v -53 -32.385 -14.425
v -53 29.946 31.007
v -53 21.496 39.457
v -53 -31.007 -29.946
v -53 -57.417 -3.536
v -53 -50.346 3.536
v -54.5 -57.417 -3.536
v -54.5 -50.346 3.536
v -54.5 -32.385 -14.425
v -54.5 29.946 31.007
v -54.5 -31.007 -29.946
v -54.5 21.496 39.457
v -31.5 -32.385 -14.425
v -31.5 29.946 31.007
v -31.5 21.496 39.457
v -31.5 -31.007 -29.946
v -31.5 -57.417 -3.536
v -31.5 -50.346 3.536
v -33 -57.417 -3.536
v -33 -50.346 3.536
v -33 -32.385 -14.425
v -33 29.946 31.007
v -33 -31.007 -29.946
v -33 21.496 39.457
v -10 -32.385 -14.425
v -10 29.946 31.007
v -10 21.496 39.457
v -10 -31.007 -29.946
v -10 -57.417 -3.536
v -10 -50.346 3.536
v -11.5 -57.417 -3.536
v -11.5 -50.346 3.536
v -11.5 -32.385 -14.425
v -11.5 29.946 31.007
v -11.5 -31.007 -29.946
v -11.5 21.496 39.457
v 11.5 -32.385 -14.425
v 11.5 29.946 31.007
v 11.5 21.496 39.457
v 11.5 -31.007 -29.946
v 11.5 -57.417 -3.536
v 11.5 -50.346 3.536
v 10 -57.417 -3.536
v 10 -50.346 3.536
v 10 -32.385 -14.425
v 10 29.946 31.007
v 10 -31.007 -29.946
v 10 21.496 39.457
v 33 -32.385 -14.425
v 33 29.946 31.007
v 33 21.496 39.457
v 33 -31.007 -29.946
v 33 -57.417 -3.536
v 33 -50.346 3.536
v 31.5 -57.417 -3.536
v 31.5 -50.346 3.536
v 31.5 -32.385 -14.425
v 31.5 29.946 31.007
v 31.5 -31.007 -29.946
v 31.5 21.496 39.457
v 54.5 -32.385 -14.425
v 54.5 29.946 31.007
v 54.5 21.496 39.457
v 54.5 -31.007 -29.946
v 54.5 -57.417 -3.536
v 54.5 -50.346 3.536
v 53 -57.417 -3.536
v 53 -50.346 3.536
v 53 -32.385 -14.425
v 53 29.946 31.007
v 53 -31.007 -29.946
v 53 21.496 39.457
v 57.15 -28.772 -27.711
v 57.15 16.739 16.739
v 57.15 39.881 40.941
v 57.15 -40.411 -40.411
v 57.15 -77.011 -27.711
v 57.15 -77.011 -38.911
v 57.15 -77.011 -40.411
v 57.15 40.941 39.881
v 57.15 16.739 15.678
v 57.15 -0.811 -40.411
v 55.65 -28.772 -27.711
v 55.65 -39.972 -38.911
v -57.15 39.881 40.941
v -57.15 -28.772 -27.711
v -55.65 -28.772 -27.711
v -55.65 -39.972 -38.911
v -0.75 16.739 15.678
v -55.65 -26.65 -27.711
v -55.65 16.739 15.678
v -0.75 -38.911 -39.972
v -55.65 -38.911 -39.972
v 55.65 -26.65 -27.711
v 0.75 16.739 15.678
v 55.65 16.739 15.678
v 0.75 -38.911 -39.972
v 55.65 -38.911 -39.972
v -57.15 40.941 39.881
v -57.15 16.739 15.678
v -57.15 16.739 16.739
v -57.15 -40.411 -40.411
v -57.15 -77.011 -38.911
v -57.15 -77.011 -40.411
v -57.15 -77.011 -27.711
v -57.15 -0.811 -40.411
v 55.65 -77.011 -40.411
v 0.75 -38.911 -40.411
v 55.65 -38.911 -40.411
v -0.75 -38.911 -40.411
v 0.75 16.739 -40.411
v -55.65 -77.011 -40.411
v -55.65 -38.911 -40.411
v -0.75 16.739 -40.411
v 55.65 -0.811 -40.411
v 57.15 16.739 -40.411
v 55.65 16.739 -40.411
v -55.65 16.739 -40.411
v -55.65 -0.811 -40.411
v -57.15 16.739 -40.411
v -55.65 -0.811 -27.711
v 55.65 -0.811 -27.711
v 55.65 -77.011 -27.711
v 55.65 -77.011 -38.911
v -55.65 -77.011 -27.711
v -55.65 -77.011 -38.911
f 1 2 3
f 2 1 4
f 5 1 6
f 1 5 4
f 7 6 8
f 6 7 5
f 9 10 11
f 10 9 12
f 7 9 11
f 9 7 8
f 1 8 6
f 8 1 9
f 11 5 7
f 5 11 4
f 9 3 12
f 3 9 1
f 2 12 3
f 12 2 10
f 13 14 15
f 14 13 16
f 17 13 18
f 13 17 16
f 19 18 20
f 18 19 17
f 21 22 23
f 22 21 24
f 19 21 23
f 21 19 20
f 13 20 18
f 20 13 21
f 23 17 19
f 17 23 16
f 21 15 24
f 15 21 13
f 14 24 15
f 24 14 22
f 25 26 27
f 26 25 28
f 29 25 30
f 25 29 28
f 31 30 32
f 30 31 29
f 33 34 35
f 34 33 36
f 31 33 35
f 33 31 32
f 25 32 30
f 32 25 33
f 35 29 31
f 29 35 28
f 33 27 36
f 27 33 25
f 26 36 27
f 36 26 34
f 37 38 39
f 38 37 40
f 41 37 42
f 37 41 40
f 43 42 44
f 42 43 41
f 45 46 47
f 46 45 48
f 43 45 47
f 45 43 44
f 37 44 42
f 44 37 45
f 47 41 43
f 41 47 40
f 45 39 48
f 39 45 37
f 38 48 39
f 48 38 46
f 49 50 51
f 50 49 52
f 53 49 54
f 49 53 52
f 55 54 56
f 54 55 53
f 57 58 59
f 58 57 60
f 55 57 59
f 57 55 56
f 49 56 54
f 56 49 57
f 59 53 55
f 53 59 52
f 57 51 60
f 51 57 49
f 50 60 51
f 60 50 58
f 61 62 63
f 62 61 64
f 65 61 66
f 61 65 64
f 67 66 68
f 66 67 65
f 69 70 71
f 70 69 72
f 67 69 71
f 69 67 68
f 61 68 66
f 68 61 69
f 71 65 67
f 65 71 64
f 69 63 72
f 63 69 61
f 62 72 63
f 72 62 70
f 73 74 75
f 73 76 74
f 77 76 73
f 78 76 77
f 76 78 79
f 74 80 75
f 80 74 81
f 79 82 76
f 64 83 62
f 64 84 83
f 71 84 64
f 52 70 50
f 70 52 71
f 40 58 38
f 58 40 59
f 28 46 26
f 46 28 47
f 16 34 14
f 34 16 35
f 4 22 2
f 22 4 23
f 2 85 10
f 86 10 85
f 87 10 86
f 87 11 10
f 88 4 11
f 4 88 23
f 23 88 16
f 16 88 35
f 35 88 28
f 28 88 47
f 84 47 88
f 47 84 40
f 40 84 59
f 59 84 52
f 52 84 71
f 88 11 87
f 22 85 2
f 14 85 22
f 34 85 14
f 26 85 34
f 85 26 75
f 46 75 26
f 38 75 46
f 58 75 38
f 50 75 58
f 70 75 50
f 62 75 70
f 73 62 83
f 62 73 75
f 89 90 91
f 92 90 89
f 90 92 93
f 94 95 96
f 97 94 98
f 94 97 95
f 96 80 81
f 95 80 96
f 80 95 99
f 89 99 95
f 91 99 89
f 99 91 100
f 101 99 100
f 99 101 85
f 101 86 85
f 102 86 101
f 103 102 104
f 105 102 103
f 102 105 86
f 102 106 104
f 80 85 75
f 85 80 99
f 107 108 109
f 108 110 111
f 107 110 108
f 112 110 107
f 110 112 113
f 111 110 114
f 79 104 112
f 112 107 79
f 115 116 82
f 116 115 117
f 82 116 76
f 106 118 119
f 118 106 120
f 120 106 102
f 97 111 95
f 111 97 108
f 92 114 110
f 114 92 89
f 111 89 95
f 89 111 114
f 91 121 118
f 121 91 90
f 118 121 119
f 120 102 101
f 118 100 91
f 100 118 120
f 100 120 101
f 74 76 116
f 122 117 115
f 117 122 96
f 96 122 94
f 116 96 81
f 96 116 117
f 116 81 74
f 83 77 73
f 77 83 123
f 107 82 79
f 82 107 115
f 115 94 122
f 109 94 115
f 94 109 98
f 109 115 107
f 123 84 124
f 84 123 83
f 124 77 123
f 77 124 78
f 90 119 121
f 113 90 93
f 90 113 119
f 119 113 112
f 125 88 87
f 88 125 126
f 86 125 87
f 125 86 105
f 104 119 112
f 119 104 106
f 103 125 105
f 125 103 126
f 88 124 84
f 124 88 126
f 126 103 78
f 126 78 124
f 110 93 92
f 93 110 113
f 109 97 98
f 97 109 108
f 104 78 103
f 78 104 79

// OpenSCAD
// Units are mm.
// Outside dimensions are specified, and thickness goes inward.

function i2mm(x) = x * 0.0254 * 1000;
x_axis = [1, 0, 0];
y_axis = [0, 1, 0];
z_axis = [0, 0, 1];

width = i2mm(4.5);
plate_thickness = 1.5;
plate_length = i2mm(4.5);
cross_offset = i2mm(1.5); // shifts the grates lower.

grate_thickness = 1.5;
grate_depth = 10;
grate_length = i2mm(1.5);

standing = i2mm(0.5);  // spacing between flat plate and soap.
grate_spacing = 20;
grate_span = i2mm(3) + grate_depth; // length of grate that holds the major axis of soap.

// minimum plate thickness that allows for quality prints.
min_thickness = 1.5;

side_support_width = i2mm(0.5);
side_support_dim = 0.5 * plate_length;

bottom_support_width = i2mm(0.25);

drainage_length = i2mm(1.5);
drainage_height = i2mm(0.5);

// derived params
rep_width = grate_thickness + grate_spacing;
repetitions = floor((width - grate_thickness) / rep_width);
margin = 0.5 * (width - (repetitions * rep_width + grate_thickness));
side_support_length = 0.5 * plate_length;
bottom_support_length = sqrt(2) * side_support_length;

module side_support() {
    shift = 0.5 * plate_length / sqrt(2) - 0.5 * side_support_dim;
    difference() {
        translate([0, -shift, -shift])
            cube(size = [min_thickness, side_support_dim, side_support_dim], center = true);
        cutter_dim = 2 * side_support_dim;
        rotate([45, 0, 0])
            translate([0, 0, 0.5 * cutter_dim])
                cube([cutter_dim, cutter_dim, cutter_dim], center = true);
    }
}

module flange() {
    union() {
        cube(size = [grate_thickness, grate_depth, grate_length], center = true);
        translate([0, 0.5 * grate_span - 0.5 * grate_depth, -0.5 * grate_length + 0.5 * standing])
            cube(size = [grate_thickness, grate_span, standing], center = true);
    }
}

difference() {
    union() {
        difference() {
            rotate([45, 0, 0]) {
                union() {
                    cube(size = [width, plate_length, plate_thickness], center = true);
                    x_base = 0.5 * grate_thickness - 0.5 * width + margin;
                    z_base = 0.5 * grate_length;
                    for (i = [0 : repetitions]) {
                        translate([x_base + i * rep_width, -cross_offset, z_base])
                            flange();
                    }
                }
            }
            translate([0, 0, -0.5 * width - side_support_length / sqrt(2)])
                cube(size = [2 * width, 2 * width, width], center = true);
        }
        side_support();
        translate([-0.5 * (width - min_thickness), 0, 0])
            side_support();
        translate([0.5 * (width - min_thickness), 0, 0])
            side_support();
    }
    translate([0, 0.5 * bottom_support_length + bottom_support_width, -0.5 * bottom_support_length + 0.5 * bottom_support_width])
        cube(size = [2 * width, 2 * bottom_support_width, 2 * bottom_support_width], center = true);
}

center_distance = 0.5 * plate_length / sqrt(2);
drainage_plate_shift = min_thickness; // so that plate is fused into rest of soap holder.

// base drainage plate.
translate([0, drainage_plate_shift - center_distance - 0.5 * drainage_length, 0.5 * min_thickness - center_distance]) {
    cube(size = [width, drainage_length, min_thickness], center = true);
}

// drainage plate sides.
drainage_side_length = 2 * drainage_length; // long enough to fuse into side supports.
translate([0, -center_distance + min_thickness, -center_distance + 0.5 * drainage_height]) {
    translate([0.5 * width - 0.5 * min_thickness, 0, 0])
        cube(size = [min_thickness, drainage_side_length, drainage_height], center = true);
    translate([-(0.5 * width - 0.5 * min_thickness), 0, 0])
        cube(size = [min_thickness, drainage_side_length, drainage_height], center = true);
}
